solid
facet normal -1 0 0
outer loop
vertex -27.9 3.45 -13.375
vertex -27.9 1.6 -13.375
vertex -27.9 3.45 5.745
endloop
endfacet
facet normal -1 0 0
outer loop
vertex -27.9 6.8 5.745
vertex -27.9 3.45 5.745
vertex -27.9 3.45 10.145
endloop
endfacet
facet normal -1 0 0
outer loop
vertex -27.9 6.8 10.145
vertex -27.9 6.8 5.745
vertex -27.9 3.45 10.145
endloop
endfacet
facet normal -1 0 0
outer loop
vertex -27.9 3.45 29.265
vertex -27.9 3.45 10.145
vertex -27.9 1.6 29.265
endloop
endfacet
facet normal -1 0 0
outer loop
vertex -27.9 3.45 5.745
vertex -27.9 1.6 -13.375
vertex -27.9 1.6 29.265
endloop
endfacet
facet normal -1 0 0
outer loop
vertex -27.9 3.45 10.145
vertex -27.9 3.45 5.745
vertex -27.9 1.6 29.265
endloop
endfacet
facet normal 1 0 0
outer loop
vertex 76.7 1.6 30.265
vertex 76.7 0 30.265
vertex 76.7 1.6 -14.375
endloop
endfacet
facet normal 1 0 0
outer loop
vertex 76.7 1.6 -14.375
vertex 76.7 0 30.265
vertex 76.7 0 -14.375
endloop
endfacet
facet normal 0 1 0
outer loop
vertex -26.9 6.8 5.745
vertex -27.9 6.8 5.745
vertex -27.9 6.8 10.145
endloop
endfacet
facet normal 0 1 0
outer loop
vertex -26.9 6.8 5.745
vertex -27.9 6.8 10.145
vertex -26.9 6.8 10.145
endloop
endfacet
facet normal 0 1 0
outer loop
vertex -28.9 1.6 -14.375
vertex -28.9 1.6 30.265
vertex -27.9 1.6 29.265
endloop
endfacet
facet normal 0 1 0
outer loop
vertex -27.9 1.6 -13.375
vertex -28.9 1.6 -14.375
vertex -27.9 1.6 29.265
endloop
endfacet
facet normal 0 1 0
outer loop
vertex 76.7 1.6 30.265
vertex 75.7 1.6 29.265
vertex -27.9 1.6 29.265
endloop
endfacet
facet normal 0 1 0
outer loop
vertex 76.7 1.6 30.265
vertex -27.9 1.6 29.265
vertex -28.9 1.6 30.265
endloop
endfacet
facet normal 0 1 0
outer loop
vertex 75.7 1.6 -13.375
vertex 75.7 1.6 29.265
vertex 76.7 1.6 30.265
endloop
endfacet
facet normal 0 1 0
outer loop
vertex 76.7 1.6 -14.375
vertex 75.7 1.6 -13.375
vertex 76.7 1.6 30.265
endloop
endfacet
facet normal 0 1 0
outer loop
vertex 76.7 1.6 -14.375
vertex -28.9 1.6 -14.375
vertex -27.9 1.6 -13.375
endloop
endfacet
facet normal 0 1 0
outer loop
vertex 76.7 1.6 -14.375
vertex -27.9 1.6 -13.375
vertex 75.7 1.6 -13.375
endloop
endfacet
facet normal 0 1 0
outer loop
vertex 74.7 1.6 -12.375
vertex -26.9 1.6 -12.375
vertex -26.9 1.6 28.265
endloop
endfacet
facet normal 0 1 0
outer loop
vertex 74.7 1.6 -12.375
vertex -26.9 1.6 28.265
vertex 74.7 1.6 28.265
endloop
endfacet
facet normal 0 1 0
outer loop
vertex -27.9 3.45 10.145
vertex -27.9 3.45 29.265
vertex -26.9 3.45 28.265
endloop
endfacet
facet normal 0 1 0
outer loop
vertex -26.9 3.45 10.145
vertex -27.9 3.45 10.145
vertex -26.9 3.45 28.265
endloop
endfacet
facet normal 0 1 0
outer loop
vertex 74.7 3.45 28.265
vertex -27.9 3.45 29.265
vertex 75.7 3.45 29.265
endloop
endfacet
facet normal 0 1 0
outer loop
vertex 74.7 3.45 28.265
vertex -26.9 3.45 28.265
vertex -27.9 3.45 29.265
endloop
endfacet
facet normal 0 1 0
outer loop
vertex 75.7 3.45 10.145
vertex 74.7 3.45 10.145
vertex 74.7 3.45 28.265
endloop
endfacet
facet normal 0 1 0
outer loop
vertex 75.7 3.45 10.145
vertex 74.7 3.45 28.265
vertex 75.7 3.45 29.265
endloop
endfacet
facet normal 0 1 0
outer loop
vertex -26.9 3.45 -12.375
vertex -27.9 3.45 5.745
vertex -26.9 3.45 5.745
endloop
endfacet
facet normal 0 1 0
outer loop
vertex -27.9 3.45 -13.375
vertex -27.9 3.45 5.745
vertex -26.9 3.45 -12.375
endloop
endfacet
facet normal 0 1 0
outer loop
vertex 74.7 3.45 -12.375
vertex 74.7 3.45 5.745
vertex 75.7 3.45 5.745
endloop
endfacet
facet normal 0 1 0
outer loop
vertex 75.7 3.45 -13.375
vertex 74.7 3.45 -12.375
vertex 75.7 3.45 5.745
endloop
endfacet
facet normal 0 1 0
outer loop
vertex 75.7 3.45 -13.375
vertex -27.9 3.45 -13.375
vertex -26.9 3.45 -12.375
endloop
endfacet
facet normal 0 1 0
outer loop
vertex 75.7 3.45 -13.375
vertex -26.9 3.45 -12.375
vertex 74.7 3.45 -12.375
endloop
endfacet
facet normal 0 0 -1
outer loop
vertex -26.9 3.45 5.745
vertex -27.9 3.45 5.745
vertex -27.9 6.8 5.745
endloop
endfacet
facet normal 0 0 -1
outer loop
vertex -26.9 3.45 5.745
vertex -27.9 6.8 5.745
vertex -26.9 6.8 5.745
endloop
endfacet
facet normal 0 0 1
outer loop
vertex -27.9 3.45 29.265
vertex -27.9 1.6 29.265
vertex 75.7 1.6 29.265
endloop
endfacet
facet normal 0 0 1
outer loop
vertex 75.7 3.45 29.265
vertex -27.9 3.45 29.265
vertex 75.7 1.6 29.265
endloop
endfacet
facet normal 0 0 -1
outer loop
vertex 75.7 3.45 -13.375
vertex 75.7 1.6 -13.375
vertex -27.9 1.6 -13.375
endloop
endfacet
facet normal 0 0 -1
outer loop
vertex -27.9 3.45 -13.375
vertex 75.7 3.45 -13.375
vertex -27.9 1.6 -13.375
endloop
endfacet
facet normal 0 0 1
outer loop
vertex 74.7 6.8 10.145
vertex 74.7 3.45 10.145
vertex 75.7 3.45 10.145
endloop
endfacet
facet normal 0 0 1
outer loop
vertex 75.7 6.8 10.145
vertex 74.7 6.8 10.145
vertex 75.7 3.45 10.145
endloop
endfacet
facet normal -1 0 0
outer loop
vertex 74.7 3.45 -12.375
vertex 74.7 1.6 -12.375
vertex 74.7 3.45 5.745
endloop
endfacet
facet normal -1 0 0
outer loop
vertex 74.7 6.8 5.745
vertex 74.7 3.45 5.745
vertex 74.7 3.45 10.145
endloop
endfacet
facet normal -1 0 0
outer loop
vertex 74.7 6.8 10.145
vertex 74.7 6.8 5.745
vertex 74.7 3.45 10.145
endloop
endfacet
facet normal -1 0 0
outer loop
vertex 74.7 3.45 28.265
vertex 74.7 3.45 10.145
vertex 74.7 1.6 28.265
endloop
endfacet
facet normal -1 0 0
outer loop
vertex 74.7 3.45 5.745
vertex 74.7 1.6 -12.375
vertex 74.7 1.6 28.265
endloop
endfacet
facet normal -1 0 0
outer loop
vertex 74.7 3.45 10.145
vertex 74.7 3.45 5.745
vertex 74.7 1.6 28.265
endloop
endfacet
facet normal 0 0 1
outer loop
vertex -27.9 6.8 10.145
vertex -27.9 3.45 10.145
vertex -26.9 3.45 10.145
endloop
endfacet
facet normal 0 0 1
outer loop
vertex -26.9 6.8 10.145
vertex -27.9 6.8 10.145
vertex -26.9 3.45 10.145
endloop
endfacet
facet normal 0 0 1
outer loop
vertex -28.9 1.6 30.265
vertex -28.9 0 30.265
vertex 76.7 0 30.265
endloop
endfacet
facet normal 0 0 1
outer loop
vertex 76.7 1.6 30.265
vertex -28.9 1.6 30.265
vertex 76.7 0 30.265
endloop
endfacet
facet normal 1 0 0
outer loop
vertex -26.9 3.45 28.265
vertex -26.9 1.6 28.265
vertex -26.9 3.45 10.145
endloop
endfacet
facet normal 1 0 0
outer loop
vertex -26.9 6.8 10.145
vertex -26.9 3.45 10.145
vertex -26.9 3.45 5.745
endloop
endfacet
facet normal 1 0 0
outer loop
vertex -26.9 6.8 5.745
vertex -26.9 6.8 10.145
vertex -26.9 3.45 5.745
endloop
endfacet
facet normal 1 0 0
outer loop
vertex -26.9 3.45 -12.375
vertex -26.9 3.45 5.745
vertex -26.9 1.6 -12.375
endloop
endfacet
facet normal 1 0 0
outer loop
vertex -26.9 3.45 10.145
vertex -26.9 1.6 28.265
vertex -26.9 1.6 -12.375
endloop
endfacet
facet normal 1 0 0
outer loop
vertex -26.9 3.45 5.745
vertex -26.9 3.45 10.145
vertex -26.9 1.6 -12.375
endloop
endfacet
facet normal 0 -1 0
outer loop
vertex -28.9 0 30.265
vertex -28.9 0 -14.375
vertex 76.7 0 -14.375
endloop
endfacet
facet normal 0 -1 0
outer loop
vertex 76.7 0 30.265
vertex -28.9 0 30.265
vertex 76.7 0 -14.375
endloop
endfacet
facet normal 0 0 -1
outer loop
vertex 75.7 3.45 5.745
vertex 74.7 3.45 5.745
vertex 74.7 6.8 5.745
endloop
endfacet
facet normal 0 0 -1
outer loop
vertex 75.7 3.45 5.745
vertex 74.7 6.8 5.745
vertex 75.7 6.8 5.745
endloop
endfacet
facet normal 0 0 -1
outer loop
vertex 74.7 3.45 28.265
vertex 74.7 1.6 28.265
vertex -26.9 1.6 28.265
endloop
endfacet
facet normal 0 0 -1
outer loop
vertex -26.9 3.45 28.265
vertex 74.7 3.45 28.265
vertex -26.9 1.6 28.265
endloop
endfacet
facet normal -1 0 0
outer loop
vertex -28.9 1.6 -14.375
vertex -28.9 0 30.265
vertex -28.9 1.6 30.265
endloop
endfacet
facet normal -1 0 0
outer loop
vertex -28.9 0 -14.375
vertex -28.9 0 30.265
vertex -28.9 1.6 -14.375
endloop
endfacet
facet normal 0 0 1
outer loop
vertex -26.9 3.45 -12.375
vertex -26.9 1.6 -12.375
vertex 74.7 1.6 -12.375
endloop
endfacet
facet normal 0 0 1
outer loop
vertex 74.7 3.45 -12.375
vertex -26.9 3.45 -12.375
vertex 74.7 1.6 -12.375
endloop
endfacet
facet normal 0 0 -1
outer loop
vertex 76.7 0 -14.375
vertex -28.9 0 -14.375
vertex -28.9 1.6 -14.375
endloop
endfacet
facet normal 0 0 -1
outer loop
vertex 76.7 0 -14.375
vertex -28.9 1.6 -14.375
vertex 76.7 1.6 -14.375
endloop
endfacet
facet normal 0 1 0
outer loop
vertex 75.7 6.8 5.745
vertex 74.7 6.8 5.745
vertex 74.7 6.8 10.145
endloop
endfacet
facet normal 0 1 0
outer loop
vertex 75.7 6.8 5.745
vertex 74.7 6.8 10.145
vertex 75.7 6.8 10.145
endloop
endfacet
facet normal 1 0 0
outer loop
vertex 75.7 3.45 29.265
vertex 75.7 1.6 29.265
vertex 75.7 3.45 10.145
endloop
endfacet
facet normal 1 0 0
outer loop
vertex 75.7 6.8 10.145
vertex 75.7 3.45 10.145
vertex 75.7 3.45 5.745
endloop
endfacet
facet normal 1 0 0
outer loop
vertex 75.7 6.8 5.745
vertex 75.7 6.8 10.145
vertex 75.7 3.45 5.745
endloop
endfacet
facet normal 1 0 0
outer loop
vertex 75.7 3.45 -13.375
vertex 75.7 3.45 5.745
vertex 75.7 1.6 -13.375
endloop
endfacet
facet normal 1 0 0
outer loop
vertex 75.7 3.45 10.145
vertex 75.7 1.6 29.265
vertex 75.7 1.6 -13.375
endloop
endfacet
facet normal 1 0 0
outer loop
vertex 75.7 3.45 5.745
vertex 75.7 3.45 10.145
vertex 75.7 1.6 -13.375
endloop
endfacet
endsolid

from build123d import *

# Parameters (mm, degrees)
SKETCH1_W           = 105.6
SKETCH1_H           = 44.64
BOSS_EXTRUDE1_DEPTH = 1.6
SKETCH1_3_W         = 103.6
SKETCH1_3_H         = 42.64
SKETCH1_3_W_2       = 101.6
SKETCH1_3_H_2       = 40.64
BOSS_EXTRUDE2_DEPTH = 3.45
SKETCH1_4_W         = 1
SKETCH1_4_H         = 4.4
BOSS_EXTRUDE3_DEPTH = 6.8


with BuildPart() as part:
    # Sketch1 → Boss-Extrude1 (new body)
    with BuildSketch(Plane(origin=(0, 0, 0), x_dir=(1, 0, 0), z_dir=(0, 1, 0))):
        with Locations((23.9, -7.945434783)):
            Rectangle(SKETCH1_W, SKETCH1_H)
    extrude(amount=BOSS_EXTRUDE1_DEPTH)

    # Sketch1<3> → Boss-Extrude2 (add)
    with BuildSketch(Plane(origin=(0, 0, 0), x_dir=(1, 0, 0), z_dir=(0, 1, 0))):
        with Locations((23.9, -7.945434783)):
            Rectangle(SKETCH1_3_W, SKETCH1_3_H)
        with Locations((23.9, -7.945434783)):
            Rectangle(SKETCH1_3_W_2, SKETCH1_3_H_2, mode=Mode.SUBTRACT)
    extrude(amount=BOSS_EXTRUDE2_DEPTH)

    # Sketch1<4> → Boss-Extrude3 (add)
    with BuildSketch(Plane(origin=(0, 0, 0), x_dir=(1, 0, 0), z_dir=(0, 1, 0))):
        with Locations((-27.4, -7.945434783)):
            Rectangle(SKETCH1_4_W, SKETCH1_4_H)
        with Locations((75.2, -7.945434783)):
            Rectangle(SKETCH1_4_W, SKETCH1_4_H)
    extrude(amount=BOSS_EXTRUDE3_DEPTH)


solid = part.part
